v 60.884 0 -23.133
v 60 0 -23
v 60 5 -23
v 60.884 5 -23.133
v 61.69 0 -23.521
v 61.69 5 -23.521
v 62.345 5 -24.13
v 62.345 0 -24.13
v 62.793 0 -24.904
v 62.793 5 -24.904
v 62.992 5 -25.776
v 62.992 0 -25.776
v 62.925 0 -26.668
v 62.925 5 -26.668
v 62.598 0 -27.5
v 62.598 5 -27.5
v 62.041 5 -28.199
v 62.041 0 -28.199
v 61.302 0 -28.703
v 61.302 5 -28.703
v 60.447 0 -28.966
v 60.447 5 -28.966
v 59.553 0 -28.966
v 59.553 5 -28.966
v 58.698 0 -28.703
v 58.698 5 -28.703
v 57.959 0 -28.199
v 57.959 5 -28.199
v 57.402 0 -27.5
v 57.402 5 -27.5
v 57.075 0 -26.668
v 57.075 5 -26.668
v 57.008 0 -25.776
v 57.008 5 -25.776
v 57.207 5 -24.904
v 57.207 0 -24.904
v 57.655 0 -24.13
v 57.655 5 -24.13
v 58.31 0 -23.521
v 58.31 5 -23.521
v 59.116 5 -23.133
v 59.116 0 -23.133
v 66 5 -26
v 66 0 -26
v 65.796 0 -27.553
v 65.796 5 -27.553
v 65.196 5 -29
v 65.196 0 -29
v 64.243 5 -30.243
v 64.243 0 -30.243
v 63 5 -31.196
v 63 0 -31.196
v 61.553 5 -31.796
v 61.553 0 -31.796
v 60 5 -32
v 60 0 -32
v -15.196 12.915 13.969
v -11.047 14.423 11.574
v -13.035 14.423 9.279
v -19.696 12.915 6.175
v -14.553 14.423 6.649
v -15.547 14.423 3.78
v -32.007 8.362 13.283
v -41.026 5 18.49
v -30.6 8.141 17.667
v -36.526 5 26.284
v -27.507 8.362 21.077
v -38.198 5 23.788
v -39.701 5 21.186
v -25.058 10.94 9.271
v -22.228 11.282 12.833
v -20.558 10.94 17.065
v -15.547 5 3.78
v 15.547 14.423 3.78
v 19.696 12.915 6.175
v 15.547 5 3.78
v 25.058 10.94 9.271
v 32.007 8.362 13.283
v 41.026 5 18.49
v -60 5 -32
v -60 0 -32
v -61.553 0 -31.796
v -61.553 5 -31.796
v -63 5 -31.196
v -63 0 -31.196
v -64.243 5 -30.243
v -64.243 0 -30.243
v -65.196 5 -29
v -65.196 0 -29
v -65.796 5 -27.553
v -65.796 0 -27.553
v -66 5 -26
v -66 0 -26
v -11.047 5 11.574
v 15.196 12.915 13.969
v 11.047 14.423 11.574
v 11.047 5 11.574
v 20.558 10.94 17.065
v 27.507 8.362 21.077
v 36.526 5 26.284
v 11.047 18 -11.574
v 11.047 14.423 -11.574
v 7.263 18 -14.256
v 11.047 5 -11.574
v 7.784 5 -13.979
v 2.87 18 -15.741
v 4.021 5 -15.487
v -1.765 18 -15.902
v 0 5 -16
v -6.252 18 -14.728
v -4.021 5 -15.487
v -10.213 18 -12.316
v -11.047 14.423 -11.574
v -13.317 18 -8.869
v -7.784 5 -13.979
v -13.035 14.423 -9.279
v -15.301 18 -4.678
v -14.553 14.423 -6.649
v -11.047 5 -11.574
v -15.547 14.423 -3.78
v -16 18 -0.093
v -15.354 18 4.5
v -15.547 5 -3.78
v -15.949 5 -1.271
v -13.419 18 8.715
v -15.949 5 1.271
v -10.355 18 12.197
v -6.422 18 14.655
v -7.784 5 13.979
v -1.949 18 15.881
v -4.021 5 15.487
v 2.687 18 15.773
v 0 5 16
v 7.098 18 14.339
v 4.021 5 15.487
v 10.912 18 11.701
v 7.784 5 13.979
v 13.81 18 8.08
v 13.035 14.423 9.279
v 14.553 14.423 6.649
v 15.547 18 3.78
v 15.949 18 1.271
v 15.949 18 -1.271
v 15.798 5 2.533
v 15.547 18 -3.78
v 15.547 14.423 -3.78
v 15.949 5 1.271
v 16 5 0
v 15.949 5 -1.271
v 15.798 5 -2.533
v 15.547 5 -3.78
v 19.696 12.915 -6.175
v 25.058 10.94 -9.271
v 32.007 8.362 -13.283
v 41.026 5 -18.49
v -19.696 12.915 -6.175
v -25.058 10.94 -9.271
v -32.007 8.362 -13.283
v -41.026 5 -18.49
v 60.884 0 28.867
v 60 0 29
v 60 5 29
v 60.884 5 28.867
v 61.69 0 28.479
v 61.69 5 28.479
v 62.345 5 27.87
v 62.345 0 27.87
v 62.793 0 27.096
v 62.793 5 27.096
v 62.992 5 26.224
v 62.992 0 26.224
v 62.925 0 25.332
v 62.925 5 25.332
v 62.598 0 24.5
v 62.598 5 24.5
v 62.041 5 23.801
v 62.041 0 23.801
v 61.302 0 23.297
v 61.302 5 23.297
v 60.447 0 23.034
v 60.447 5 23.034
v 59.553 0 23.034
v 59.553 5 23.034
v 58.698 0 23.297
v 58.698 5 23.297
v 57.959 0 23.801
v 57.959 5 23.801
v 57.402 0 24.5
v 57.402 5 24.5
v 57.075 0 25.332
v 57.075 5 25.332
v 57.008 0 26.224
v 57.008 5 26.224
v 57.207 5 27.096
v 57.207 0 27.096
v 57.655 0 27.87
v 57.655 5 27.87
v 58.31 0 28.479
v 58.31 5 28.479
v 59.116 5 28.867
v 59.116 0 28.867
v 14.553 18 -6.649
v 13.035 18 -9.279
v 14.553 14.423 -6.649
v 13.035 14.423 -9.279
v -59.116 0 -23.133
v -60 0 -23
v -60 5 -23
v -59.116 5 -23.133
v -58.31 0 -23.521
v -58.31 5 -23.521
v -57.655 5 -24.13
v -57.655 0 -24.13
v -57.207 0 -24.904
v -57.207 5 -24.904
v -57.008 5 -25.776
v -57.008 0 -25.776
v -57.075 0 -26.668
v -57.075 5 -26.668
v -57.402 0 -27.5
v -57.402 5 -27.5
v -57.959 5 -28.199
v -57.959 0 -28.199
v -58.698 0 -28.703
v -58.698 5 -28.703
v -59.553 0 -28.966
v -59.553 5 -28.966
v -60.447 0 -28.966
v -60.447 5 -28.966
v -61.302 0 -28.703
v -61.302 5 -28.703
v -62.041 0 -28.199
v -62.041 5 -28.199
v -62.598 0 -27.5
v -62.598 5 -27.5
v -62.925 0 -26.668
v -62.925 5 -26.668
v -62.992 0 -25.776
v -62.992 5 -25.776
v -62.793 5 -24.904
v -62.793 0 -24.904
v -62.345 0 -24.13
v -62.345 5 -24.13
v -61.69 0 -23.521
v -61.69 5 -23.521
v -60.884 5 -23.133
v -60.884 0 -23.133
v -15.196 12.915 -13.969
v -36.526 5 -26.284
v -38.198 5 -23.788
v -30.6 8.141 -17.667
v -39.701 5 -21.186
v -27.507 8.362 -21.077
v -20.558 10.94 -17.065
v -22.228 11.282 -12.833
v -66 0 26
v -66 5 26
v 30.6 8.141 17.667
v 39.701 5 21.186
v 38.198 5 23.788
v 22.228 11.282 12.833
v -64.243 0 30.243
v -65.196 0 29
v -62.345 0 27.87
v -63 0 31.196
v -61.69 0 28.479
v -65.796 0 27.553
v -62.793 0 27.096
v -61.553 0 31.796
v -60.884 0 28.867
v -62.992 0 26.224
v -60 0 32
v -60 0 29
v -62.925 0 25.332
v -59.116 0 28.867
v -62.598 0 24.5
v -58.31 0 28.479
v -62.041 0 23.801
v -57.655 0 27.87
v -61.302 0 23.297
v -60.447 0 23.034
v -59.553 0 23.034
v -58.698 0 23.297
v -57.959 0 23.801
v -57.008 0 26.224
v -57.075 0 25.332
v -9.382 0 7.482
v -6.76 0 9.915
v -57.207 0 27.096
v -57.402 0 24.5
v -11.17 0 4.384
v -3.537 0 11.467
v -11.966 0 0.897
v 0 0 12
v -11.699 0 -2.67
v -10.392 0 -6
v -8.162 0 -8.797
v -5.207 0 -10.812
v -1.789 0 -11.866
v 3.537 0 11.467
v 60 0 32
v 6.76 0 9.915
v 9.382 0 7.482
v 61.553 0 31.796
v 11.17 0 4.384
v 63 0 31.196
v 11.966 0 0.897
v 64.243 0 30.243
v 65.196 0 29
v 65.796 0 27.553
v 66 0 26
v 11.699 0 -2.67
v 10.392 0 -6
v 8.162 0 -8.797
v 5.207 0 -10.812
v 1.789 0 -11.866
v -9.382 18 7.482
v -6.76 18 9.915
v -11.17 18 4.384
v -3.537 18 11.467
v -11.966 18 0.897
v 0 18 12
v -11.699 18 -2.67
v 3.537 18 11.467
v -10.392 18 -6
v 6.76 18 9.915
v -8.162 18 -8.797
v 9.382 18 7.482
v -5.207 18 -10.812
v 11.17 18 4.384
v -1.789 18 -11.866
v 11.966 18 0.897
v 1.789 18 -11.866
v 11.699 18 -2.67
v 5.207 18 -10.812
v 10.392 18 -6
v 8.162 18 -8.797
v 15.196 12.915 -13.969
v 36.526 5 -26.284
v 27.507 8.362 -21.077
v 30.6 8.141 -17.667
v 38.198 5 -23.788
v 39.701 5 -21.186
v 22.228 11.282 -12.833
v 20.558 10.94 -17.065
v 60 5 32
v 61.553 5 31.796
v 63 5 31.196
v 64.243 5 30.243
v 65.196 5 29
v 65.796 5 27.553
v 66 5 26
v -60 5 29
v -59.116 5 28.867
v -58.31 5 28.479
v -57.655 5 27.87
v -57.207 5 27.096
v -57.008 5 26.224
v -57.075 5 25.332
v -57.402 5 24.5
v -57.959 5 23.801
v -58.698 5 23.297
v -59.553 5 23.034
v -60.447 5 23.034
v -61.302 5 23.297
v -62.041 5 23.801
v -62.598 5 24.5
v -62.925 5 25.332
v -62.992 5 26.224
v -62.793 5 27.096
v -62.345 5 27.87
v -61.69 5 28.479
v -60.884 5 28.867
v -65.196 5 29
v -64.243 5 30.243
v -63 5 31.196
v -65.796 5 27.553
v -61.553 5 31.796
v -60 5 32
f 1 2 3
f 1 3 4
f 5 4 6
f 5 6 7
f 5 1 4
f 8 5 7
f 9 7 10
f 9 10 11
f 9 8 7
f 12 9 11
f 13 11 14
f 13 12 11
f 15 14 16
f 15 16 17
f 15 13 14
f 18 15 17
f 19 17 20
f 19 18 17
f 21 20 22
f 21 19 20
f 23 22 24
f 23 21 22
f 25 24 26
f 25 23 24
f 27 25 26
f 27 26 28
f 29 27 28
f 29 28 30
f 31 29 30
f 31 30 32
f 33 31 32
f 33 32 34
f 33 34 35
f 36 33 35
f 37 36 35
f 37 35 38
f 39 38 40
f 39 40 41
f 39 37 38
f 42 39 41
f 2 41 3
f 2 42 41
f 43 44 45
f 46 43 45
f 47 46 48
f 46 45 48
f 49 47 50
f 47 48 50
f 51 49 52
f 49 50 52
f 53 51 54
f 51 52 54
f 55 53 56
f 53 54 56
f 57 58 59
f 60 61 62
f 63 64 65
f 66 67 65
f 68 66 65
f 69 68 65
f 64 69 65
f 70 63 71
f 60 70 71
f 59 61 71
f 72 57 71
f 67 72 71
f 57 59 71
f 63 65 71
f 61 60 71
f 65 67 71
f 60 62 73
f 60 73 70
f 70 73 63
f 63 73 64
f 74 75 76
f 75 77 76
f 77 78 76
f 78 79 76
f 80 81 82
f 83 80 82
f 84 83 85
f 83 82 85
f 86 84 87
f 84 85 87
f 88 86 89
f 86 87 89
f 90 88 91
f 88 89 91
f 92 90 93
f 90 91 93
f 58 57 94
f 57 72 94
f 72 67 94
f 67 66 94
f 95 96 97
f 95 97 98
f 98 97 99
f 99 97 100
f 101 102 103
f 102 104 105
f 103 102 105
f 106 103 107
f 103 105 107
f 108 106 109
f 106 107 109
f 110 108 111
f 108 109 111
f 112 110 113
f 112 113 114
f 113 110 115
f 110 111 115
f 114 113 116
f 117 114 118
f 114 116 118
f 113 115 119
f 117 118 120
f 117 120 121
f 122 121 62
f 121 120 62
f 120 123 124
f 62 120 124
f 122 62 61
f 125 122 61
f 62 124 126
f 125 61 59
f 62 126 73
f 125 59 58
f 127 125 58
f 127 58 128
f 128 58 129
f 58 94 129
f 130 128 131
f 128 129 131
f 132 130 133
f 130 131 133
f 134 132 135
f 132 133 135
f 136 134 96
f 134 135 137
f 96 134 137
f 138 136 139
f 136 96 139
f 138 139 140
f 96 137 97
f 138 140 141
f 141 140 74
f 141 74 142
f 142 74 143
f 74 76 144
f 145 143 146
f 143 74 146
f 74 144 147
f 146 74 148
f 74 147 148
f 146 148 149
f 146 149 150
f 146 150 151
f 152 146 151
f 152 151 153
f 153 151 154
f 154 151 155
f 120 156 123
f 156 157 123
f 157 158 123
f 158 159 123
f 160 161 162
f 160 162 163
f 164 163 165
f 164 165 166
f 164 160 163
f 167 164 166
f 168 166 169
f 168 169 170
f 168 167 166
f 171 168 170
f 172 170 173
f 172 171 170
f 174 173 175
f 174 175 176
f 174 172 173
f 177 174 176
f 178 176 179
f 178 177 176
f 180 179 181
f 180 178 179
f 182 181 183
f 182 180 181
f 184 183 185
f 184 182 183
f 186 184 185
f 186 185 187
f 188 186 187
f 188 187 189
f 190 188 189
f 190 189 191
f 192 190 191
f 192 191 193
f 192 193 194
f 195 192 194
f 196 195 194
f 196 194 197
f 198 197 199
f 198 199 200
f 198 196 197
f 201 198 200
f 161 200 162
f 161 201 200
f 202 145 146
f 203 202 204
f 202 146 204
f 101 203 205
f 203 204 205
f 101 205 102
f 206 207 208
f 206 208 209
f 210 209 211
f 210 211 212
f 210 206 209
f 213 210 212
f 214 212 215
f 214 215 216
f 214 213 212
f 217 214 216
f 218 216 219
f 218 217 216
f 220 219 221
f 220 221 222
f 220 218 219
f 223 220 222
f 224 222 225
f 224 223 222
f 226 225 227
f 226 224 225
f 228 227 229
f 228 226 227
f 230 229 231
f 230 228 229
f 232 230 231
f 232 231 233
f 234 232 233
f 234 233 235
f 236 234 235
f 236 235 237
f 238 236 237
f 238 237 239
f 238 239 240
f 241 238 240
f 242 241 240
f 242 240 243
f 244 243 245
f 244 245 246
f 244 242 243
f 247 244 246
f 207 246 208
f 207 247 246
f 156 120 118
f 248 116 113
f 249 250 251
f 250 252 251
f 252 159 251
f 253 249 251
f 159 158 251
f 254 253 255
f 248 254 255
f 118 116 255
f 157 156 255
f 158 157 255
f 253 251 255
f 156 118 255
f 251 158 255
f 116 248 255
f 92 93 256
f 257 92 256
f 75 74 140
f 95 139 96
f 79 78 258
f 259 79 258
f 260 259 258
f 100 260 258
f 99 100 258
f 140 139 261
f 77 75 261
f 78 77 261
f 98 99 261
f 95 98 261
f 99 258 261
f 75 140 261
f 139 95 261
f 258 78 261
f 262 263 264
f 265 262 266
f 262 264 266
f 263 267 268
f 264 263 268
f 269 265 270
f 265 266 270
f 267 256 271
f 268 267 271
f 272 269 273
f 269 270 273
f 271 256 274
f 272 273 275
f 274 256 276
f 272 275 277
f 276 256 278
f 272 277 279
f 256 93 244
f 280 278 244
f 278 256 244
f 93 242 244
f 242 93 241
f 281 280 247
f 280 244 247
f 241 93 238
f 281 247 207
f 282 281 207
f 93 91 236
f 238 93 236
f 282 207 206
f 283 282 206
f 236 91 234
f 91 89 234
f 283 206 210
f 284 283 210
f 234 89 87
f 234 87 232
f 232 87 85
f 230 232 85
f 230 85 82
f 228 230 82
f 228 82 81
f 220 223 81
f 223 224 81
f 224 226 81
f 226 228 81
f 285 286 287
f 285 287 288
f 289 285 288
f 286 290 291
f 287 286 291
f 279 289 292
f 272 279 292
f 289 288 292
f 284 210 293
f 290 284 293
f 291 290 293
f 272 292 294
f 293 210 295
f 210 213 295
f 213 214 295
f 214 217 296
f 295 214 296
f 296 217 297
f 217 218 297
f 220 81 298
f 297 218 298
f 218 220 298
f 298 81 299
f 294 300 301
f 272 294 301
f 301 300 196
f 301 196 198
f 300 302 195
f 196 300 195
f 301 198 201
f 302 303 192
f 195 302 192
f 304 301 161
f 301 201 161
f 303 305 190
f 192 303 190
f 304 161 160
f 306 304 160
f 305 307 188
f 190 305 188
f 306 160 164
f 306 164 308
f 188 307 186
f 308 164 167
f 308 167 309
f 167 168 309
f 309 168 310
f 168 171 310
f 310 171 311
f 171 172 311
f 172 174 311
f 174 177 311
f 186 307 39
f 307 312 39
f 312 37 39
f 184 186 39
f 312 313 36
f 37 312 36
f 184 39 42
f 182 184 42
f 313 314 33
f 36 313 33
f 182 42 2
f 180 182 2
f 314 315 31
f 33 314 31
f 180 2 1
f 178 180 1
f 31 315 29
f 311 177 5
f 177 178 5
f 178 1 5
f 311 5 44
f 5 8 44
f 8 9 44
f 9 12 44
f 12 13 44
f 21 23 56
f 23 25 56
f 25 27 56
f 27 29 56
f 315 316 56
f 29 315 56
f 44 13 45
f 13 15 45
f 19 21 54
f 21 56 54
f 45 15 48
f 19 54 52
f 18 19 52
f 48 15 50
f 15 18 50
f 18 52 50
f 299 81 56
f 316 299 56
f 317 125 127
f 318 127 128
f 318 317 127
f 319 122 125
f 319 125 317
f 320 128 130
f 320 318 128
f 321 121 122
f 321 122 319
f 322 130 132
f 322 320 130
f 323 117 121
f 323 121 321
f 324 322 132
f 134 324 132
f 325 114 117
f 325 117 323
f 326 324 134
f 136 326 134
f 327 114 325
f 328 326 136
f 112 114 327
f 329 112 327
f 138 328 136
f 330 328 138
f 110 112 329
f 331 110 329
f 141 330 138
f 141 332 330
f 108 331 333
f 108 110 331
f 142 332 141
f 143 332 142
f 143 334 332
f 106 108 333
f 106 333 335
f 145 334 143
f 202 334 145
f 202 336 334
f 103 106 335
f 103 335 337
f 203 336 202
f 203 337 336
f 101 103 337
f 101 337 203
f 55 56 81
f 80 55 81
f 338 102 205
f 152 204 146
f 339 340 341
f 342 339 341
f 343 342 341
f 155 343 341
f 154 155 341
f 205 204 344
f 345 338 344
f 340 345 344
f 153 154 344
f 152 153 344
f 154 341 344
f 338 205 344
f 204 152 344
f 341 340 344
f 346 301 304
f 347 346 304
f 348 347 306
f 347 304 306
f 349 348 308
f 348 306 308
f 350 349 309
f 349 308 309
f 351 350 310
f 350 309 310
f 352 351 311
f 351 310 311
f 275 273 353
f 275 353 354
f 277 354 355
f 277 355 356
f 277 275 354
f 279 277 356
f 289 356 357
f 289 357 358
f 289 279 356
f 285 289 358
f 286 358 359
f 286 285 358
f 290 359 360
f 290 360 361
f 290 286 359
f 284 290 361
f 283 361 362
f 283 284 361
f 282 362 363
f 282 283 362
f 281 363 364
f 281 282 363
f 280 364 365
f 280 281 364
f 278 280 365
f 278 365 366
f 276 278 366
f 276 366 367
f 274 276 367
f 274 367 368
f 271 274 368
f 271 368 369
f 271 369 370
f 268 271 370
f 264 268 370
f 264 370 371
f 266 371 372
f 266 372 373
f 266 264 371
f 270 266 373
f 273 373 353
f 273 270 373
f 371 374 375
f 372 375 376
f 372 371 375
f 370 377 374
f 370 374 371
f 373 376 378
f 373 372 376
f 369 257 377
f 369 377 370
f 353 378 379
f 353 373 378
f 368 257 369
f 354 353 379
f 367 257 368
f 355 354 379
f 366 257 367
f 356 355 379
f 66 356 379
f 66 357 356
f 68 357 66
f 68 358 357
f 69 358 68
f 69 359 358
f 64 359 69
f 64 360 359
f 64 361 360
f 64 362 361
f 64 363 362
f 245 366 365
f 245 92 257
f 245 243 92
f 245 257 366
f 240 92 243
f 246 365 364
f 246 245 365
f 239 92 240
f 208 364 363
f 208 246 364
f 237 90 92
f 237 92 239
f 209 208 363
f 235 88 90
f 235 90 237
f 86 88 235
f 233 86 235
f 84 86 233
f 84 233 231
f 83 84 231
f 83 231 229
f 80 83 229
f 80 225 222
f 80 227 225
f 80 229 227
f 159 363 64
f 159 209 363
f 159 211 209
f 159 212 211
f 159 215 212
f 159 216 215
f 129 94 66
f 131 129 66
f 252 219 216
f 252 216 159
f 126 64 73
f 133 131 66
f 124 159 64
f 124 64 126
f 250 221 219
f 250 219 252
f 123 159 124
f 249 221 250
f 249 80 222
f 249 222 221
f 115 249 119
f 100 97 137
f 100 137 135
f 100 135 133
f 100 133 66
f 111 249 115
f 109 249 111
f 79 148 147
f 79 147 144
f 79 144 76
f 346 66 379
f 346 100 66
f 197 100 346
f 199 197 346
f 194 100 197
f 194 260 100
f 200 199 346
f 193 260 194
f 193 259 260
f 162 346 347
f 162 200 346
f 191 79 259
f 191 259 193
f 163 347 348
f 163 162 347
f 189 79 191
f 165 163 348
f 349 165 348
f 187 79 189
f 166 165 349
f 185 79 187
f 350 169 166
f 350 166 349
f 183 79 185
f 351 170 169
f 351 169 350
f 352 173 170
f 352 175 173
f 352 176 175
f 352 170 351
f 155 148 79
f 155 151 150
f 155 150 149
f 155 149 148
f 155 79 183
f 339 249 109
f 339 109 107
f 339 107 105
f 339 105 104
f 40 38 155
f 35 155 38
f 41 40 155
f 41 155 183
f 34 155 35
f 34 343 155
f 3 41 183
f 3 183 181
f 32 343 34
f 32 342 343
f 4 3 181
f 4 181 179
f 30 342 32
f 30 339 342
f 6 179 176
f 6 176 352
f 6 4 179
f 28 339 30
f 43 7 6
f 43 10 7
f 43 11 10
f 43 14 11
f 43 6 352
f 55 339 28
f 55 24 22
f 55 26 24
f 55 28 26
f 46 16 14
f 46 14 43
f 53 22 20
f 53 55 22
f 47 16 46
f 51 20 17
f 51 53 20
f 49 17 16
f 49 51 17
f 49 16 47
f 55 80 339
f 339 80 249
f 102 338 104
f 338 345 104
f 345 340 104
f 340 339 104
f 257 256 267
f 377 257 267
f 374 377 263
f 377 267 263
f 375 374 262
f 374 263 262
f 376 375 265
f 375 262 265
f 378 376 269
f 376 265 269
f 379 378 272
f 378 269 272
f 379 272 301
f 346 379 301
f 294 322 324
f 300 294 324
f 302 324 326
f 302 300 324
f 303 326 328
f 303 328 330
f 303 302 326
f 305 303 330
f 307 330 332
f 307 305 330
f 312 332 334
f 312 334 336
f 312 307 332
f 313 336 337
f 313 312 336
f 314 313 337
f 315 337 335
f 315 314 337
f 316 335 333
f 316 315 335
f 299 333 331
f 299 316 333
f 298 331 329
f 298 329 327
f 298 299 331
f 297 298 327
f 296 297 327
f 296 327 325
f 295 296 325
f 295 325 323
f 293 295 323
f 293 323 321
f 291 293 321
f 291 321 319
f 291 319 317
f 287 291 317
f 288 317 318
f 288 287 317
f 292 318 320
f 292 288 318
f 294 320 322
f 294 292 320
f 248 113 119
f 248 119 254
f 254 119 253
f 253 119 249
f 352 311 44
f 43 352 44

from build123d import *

# Parameters (mm, degrees)
SKETCH1_R           = 12
BOSS_EXTRUDE1_DEPTH = 18
SKETCH1_3_R         = 3
BOSS_EXTRUDE2_DEPTH = 5
BOSS_EXTRUDE4_DEPTH = 18


with BuildPart() as part:
    # Sketch1 → Boss-Extrude1 (new body)
    with BuildSketch(Plane(origin=(0, 0, 0), x_dir=(1, 0, 0), z_dir=(0, 1, 0))):
        with BuildLine():
            ThreePointArc((-15.547086147, -3.779961949), (-13.856406461, -8), (-11.047086147, -11.574190583))
            ThreePointArc((-11.047086147, -11.574190583), (0, -16), (11.047086147, -11.574190583))
            ThreePointArc((11.047086147, -11.574190583), (13.856406461, -8), (15.547086147, -3.779961949))
            ThreePointArc((15.547086147, -3.779961949), (15.88636803, -1.903499625), (16, 0))
            ThreePointArc((16, 0), (15.88636803, 1.903499625), (15.547086147, 3.779961949))
            ThreePointArc((15.547086147, 3.779961949), (13.856406461, 8), (11.047086147, 11.574190583))
            ThreePointArc((11.047086147, 11.574190583), (0, 16), (-11.047086147, 11.574190583))
            ThreePointArc((-11.047086147, 11.574190583), (-13.856406461, 8), (-15.547086147, 3.779961949))
            ThreePointArc((-15.547086147, 3.779961949), (-16, 0), (-15.547086147, -3.779961949))
        make_face()
        Circle(SKETCH1_R, mode=Mode.SUBTRACT)
    extrude(amount=BOSS_EXTRUDE1_DEPTH)

    # Sketch1<3> → Boss-Extrude2 (add)
    with BuildSketch(Plane(origin=(0, 0, 0), x_dir=(1, 0, 0), z_dir=(0, 1, 0))):
        with BuildLine():
            ThreePointArc((-60, 32), (-64.242640687, 30.242640687), (-66, 26))
            Line((-66, 26), (-66, -26))
            ThreePointArc((-66, -26), (-64.242640687, -30.242640687), (-60, -32))
            Line((-60, -32), (60, -32))
            ThreePointArc((60, -32), (64.242640687, -30.242640687), (66, -26))
            Line((66, -26), (66, 26))
            ThreePointArc((66, 26), (64.242640687, 30.242640687), (60, 32))
            Line((60, 32), (-60, 32))
        make_face()
        with Locations((-60, -26)):
            Circle(SKETCH1_3_R, mode=Mode.SUBTRACT)
        with Locations((60, -26)):
            Circle(SKETCH1_3_R, mode=Mode.SUBTRACT)
        with Locations((-60, 26)):
            Circle(SKETCH1_3_R, mode=Mode.SUBTRACT)
        with BuildLine():
            ThreePointArc((11.047086147, -11.574190583), (0, -16), (-11.047086147, -11.574190583))
            Line((-11.047086147, -11.574190583), (-36.72114317, -26.397114317))
            Line((-36.72114317, -26.397114317), (-41.22114317, -18.602885683))
            Line((-41.22114317, -18.602885683), (-15.547086147, -3.779961949))
            ThreePointArc((-15.547086147, -3.779961949), (-16, 0), (-15.547086147, 3.779961949))
            Line((-15.547086147, 3.779961949), (-41.22114317, 18.602885683))
            Line((-41.22114317, 18.602885683), (-36.72114317, 26.397114317))
            Line((-36.72114317, 26.397114317), (-11.047086147, 11.574190583))
            ThreePointArc((-11.047086147, 11.574190583), (0, 16), (11.047086147, 11.574190583))
            Line((11.047086147, 11.574190583), (36.72114317, 26.397114317))
            Line((36.72114317, 26.397114317), (41.22114317, 18.602885683))
            Line((41.22114317, 18.602885683), (15.547086147, 3.779961949))
            ThreePointArc((15.547086147, 3.779961949), (15.88636803, 1.903499625), (16, 0))
            ThreePointArc((16, 0), (15.88636803, -1.903499625), (15.547086147, -3.779961949))
            Line((15.547086147, -3.779961949), (41.22114317, -18.602885683))
            Line((41.22114317, -18.602885683), (36.72114317, -26.397114317))
            Line((36.72114317, -26.397114317), (11.047086147, -11.574190583))
        make_face(mode=Mode.SUBTRACT)
        with Locations((60, 26)):
            Circle(SKETCH1_3_R, mode=Mode.SUBTRACT)
    extrude(amount=BOSS_EXTRUDE2_DEPTH)

    # Sketch1<6> → Boss-Extrude4 (add)
    with BuildSketch(Plane(origin=(0, 0, 0), x_dir=(1, 0, 0), z_dir=(0, 1, 0))):
        with BuildLine():
            Line((-36.72114317, -26.397114317), (-11.047086147, -11.574190583))
            ThreePointArc((-11.047086147, -11.574190583), (-13.856406461, -8), (-15.547086147, -3.779961949))
            Line((-15.547086147, -3.779961949), (-41.22114317, -18.602885683))
            Line((-41.22114317, -18.602885683), (-36.72114317, -26.397114317))
        make_face()
        with BuildLine():
            ThreePointArc((15.547086147, -3.779961949), (13.856406461, -8), (11.047086147, -11.574190583))
            Line((11.047086147, -11.574190583), (36.72114317, -26.397114317))
            Line((36.72114317, -26.397114317), (41.22114317, -18.602885683))
            Line((41.22114317, -18.602885683), (15.547086147, -3.779961949))
        make_face()
        with BuildLine():
            Line((-41.22114317, 18.602885683), (-15.547086147, 3.779961949))
            ThreePointArc((-15.547086147, 3.779961949), (-13.856406461, 8), (-11.047086147, 11.574190583))
            Line((-11.047086147, 11.574190583), (-36.72114317, 26.397114317))
            Line((-36.72114317, 26.397114317), (-41.22114317, 18.602885683))
        make_face()
        with BuildLine():
            Line((36.72114317, 26.397114317), (11.047086147, 11.574190583))
            ThreePointArc((11.047086147, 11.574190583), (13.856406461, 8), (15.547086147, 3.779961949))
            Line((15.547086147, 3.779961949), (41.22114317, 18.602885683))
            Line((41.22114317, 18.602885683), (36.72114317, 26.397114317))
        make_face()
    extrude(amount=BOSS_EXTRUDE4_DEPTH)

    # Sketch18 → Cut-Revolve4 (revolve, cut)
    with BuildSketch(Plane(origin=(0, 0, 0), x_dir=(0, -1, 0), z_dir=(-1, 0, 0))):
        Polygon((-18, 16), (-14.422671191, 16), (-5, 45), (-5, 47.498753947), (-18, 47.498753947), align=None)
    revolve(axis=Axis((0, 18.9, 0), (0, -1, 0)), mode=Mode.SUBTRACT)


solid = part.part
